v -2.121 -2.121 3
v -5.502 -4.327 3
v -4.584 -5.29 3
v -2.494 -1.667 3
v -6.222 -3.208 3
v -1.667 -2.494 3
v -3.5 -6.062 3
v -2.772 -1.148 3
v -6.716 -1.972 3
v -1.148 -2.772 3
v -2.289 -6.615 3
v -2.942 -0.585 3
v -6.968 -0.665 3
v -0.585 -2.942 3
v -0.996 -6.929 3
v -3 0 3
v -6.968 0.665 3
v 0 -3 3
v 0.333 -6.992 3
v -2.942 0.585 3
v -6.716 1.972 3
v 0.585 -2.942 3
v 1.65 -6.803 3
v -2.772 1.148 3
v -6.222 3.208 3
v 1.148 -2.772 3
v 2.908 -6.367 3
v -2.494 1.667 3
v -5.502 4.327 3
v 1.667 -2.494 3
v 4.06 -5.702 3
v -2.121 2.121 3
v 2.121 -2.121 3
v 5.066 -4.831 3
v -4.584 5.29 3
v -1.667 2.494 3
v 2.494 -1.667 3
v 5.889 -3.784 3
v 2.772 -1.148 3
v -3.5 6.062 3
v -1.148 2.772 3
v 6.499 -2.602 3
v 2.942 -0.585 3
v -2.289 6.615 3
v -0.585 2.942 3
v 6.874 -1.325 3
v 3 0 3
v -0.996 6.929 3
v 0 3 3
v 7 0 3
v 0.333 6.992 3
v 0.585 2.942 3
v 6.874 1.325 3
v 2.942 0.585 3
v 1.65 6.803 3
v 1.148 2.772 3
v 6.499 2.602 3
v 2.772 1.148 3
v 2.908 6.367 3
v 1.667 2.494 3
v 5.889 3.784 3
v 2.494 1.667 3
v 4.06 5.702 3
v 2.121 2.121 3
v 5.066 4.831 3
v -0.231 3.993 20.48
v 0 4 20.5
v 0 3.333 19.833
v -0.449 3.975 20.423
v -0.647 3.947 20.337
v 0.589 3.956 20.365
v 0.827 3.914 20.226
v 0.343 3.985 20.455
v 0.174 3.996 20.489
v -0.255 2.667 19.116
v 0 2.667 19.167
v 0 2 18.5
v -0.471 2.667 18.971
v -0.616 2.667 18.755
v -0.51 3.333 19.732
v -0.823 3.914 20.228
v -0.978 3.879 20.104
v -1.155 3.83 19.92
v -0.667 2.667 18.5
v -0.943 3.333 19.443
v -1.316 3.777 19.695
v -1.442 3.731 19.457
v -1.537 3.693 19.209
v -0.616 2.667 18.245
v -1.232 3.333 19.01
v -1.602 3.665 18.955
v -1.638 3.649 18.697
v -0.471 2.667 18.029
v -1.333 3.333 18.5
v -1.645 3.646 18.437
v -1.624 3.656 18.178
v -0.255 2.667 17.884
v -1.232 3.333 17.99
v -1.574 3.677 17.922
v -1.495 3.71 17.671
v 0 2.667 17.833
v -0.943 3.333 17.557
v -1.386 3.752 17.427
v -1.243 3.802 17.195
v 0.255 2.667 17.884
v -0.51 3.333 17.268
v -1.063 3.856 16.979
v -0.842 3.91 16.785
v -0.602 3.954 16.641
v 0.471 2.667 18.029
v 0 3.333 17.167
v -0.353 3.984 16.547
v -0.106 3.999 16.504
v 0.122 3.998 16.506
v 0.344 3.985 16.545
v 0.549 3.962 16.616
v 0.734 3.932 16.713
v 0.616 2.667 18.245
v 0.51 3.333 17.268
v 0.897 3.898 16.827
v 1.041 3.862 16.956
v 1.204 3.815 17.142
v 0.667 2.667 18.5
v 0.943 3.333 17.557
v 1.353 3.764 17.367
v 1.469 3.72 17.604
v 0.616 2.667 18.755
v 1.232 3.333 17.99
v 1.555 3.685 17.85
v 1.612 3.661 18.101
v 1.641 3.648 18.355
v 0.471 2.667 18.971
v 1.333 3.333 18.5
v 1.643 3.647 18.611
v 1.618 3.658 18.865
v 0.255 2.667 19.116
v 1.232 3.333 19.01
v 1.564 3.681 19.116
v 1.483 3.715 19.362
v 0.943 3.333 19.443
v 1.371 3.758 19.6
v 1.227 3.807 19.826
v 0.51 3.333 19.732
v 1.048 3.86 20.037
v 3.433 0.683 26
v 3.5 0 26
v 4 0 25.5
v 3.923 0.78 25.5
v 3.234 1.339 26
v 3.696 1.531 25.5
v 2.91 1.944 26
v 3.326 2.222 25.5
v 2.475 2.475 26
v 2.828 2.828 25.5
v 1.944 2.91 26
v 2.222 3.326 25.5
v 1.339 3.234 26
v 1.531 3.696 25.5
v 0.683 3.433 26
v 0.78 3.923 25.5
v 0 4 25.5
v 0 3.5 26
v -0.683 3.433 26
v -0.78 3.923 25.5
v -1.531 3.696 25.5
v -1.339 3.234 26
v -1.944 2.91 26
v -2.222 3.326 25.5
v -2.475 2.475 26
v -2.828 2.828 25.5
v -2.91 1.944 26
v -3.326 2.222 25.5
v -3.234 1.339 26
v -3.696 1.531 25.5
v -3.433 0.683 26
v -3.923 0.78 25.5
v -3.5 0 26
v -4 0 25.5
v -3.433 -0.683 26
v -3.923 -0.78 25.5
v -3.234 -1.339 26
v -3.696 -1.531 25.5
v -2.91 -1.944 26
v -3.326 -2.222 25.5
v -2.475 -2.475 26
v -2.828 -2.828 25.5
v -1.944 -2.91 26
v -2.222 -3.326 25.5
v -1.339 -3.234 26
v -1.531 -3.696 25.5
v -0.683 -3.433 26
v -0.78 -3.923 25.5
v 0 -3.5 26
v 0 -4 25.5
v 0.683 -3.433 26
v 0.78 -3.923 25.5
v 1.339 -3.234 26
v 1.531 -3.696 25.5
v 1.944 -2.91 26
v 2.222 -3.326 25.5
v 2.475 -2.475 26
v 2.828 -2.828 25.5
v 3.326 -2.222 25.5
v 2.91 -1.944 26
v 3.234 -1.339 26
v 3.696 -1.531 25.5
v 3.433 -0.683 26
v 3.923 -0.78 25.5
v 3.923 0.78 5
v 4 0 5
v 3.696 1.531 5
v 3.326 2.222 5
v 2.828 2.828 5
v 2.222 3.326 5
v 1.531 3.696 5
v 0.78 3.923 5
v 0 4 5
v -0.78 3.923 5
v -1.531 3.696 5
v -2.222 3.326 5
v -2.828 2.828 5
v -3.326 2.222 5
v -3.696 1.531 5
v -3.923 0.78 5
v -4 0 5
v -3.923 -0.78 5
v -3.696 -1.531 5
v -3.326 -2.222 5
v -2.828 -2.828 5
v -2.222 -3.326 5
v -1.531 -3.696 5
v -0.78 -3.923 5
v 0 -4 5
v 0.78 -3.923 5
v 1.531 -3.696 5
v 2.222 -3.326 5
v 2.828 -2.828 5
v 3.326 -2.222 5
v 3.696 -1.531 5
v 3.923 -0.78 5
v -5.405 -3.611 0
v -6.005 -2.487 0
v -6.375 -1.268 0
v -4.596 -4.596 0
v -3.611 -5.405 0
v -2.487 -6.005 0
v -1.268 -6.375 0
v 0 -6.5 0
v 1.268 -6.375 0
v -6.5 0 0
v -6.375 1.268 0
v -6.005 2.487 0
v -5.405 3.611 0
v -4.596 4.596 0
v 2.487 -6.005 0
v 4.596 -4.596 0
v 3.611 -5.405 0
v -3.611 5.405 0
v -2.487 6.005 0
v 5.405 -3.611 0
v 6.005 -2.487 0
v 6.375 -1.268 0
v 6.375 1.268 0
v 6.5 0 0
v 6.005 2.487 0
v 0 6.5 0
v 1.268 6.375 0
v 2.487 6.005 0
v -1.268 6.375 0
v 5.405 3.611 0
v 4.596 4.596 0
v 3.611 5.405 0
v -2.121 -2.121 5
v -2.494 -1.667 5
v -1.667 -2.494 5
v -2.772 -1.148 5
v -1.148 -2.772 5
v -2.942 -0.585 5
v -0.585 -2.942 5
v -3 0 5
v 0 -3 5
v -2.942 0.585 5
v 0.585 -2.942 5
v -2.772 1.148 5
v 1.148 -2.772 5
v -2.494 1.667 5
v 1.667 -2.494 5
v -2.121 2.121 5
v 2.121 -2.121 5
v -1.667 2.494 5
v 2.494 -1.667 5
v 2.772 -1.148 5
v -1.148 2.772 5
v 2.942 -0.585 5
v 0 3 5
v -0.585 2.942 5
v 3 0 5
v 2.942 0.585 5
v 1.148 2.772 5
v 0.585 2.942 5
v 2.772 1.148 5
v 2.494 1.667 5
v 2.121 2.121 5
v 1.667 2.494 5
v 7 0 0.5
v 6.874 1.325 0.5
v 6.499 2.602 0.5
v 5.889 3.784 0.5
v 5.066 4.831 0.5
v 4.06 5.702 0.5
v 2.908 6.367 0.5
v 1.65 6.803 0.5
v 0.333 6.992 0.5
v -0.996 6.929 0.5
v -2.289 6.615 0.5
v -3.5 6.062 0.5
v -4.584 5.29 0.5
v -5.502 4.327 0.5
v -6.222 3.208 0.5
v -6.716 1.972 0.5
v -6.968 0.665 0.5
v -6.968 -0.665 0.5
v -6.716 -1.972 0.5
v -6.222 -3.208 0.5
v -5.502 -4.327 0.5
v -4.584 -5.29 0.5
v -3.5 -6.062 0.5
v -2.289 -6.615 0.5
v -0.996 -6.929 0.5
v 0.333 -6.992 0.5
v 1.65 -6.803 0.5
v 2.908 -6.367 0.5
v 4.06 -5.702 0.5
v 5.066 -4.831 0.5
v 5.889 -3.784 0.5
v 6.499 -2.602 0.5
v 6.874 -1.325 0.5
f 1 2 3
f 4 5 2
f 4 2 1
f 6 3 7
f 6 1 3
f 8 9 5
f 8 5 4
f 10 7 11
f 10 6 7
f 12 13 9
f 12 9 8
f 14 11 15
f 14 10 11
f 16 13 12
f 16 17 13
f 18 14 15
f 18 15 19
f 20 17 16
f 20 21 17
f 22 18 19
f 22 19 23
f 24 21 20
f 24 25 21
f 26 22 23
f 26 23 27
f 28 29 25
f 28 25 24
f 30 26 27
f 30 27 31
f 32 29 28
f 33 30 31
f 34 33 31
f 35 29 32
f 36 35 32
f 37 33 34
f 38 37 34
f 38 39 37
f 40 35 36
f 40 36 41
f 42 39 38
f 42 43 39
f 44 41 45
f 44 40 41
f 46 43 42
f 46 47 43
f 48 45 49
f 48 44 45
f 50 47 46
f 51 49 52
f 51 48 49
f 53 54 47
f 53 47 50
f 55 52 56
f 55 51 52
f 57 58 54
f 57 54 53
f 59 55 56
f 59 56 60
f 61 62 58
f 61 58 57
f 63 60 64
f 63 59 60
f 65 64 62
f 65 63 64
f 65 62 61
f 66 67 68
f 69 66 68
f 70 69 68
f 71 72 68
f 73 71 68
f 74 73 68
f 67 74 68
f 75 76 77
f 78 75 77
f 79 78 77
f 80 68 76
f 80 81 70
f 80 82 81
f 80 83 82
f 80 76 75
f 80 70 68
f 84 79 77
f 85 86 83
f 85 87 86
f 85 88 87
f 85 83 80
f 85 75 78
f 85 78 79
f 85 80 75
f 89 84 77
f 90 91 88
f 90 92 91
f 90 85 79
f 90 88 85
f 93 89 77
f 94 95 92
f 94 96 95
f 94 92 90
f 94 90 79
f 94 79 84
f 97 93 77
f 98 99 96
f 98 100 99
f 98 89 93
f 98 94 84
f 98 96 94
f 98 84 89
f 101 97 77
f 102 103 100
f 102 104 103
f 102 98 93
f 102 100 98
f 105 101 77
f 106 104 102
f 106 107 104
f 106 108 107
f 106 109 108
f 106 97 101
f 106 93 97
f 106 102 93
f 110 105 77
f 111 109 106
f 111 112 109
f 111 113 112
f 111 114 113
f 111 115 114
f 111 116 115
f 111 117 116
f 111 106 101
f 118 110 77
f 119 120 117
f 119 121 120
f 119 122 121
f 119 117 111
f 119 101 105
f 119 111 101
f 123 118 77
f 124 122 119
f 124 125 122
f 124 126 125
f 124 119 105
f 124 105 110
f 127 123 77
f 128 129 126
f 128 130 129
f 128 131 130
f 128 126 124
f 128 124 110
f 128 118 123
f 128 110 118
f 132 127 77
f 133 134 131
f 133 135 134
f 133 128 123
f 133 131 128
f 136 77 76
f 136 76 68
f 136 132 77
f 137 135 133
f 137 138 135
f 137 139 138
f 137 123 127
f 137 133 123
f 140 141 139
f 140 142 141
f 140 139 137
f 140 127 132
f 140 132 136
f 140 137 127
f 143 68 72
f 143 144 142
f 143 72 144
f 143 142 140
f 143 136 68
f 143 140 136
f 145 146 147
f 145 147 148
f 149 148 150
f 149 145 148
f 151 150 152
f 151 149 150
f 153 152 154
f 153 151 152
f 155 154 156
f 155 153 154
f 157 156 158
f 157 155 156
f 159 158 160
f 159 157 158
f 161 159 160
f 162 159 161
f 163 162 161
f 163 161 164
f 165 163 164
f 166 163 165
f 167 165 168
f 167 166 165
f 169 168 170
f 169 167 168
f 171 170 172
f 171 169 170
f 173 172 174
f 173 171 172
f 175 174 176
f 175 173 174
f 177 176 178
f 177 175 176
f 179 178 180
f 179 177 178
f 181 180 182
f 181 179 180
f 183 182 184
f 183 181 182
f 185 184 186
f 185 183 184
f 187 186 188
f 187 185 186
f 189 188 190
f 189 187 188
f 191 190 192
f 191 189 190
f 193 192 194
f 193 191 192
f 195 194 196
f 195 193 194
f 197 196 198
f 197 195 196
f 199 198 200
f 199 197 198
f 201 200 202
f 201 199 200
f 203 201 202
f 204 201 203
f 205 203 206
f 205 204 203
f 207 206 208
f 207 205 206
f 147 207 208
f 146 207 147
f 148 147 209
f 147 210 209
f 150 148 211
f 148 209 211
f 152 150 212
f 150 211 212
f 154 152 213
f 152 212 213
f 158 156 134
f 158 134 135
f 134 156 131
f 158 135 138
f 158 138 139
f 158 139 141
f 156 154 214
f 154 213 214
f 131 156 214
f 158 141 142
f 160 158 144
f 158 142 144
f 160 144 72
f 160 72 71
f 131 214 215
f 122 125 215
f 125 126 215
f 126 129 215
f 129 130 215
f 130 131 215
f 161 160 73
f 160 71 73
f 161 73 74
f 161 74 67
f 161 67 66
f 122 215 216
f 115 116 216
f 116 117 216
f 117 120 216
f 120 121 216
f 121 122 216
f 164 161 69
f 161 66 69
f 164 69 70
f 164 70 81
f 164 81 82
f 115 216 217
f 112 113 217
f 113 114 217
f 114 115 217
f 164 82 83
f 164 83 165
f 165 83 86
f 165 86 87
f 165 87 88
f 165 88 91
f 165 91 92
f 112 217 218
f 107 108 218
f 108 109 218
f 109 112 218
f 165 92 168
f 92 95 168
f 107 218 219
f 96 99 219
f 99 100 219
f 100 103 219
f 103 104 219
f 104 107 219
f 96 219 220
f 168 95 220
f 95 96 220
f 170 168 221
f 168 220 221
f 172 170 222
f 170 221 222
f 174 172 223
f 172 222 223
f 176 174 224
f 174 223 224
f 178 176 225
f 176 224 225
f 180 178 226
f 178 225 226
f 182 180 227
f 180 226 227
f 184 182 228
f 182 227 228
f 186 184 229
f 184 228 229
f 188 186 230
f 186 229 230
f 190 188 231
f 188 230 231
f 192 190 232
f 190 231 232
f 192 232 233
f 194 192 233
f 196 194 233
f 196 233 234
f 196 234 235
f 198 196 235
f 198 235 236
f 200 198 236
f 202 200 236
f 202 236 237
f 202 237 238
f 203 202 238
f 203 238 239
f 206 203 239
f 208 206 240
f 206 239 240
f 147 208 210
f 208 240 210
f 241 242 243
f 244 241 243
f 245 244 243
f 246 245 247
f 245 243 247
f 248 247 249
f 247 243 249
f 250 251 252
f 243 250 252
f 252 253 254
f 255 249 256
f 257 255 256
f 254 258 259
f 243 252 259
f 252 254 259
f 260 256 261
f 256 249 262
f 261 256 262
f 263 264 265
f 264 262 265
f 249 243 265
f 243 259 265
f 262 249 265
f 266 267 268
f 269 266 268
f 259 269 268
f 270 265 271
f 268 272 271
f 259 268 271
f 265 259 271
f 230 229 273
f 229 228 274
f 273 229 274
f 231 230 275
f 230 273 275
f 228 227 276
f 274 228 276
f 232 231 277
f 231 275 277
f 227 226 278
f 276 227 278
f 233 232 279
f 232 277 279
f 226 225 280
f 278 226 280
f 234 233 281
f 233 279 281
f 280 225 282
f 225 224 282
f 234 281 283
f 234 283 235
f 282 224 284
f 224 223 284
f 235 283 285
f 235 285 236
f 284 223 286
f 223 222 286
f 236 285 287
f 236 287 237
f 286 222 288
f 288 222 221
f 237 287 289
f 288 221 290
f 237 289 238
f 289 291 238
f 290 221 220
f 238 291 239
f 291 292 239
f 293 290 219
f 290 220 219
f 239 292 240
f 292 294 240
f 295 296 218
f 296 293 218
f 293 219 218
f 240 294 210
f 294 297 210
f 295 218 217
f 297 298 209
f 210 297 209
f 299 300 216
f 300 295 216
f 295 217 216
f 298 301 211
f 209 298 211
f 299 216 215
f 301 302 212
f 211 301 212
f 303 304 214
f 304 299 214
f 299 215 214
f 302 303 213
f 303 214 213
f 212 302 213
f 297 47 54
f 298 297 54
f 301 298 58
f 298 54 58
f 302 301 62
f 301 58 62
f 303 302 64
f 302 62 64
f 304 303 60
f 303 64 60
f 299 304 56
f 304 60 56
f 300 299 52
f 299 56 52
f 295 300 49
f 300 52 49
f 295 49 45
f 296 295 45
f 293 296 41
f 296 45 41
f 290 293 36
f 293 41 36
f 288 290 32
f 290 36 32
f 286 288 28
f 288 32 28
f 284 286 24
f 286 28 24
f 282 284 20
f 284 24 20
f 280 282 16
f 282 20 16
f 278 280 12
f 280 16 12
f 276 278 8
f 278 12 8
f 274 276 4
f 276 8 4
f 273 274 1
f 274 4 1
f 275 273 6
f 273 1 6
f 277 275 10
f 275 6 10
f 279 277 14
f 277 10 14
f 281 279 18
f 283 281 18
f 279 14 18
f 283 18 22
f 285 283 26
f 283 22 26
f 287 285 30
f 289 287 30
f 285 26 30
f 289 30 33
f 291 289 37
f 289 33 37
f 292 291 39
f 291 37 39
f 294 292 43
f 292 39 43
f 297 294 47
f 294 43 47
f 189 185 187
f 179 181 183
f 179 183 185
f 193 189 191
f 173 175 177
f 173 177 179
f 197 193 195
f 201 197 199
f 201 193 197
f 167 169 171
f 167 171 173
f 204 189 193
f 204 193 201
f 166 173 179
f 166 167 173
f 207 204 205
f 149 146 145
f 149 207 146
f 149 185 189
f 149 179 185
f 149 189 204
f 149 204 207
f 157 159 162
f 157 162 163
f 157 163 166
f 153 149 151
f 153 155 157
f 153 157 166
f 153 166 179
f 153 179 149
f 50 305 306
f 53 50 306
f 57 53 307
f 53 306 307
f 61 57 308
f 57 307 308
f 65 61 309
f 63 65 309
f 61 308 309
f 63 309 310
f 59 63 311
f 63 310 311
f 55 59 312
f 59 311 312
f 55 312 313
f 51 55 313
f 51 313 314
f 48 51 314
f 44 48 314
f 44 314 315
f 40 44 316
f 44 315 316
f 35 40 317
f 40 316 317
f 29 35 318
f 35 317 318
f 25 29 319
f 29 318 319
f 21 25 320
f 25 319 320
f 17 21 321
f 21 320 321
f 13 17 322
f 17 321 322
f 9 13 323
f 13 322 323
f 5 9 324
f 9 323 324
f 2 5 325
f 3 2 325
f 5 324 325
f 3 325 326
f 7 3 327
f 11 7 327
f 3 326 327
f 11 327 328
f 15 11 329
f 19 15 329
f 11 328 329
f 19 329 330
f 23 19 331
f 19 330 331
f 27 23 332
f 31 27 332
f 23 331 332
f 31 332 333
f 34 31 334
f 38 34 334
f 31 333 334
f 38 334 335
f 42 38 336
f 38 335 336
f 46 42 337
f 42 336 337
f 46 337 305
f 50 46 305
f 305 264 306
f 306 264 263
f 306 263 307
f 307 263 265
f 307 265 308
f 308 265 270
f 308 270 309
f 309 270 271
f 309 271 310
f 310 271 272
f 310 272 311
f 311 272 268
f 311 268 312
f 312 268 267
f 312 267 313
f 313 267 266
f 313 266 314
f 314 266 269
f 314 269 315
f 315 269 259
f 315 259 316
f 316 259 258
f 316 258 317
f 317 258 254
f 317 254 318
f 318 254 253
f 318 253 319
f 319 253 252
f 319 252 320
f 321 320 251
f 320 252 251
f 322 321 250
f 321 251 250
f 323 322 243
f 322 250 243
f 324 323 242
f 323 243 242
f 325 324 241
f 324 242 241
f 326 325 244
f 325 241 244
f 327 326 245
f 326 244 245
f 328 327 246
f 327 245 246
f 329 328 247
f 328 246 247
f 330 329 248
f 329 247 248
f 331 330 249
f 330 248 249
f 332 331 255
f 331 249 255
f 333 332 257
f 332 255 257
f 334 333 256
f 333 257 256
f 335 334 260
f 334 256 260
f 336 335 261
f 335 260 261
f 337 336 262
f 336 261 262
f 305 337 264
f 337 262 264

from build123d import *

# Parameters (mm, degrees)
SKETCH_1_R          = 7
EXTRUDE_1_DEPTH     = 3
SKETCH_2_R          = 4
EXTRUDE_2_DEPTH     = 23
SKETCH_3_OUTSIDE_W  = 22.536
SKETCH_3_OUTSIDE_H  = 22.536
SKETCH_3_OUTSIDE_R  = 3
CUT_EXTRUDE_1_DEPTH = 2
CHAMFER_1_SIZE      = 0.5


with BuildPart() as part:
    # 草图1 → 凸台-拉伸1 (new body)
    with BuildSketch(Plane.XY):
        Circle(SKETCH_1_R)
    extrude(amount=EXTRUDE_1_DEPTH)

    # 草图2 → 凸台-拉伸2 (add)
    with BuildSketch(Plane.XY.offset(3)):
        Circle(SKETCH_2_R)
    extrude(amount=EXTRUDE_2_DEPTH)

    # 草图3 outside → 切除-拉伸1 (cut)
    with BuildSketch(Plane.XY.offset(3)):
        Rectangle(SKETCH_3_OUTSIDE_W, SKETCH_3_OUTSIDE_H)
        Circle(SKETCH_3_OUTSIDE_R, mode=Mode.SUBTRACT)
    extrude(amount=CUT_EXTRUDE_1_DEPTH, mode=Mode.SUBTRACT)

    # 倒角1
    chamfer_1_edges = [part.edges().sort_by_distance(p)[0] for p in [
        (-7, 0, 0),
        (-4, 0, 26),
    ]]
    chamfer(chamfer_1_edges, length=CHAMFER_1_SIZE)

    # 草图4 → 切除-旋转1 (revolve, cut)
    with BuildSketch(Plane(origin=(0, 0, 0), x_dir=(0, 0, -1), z_dir=(1, 0, 0)), mode=Mode.PRIVATE) as cut_revolve_1_sk:
        Polygon((-18.5, 2), (-16.5, 4), (-18.5, 4), align=None)
    revolve(cut_revolve_1_sk.sketch.rotate(Axis((0, 6.943953148, 18.5), (0, -1, 0)), 180), axis=Axis((0, 6.943953148, 18.5), (0, -1, 0)), mode=Mode.SUBTRACT)


solid = part.part
